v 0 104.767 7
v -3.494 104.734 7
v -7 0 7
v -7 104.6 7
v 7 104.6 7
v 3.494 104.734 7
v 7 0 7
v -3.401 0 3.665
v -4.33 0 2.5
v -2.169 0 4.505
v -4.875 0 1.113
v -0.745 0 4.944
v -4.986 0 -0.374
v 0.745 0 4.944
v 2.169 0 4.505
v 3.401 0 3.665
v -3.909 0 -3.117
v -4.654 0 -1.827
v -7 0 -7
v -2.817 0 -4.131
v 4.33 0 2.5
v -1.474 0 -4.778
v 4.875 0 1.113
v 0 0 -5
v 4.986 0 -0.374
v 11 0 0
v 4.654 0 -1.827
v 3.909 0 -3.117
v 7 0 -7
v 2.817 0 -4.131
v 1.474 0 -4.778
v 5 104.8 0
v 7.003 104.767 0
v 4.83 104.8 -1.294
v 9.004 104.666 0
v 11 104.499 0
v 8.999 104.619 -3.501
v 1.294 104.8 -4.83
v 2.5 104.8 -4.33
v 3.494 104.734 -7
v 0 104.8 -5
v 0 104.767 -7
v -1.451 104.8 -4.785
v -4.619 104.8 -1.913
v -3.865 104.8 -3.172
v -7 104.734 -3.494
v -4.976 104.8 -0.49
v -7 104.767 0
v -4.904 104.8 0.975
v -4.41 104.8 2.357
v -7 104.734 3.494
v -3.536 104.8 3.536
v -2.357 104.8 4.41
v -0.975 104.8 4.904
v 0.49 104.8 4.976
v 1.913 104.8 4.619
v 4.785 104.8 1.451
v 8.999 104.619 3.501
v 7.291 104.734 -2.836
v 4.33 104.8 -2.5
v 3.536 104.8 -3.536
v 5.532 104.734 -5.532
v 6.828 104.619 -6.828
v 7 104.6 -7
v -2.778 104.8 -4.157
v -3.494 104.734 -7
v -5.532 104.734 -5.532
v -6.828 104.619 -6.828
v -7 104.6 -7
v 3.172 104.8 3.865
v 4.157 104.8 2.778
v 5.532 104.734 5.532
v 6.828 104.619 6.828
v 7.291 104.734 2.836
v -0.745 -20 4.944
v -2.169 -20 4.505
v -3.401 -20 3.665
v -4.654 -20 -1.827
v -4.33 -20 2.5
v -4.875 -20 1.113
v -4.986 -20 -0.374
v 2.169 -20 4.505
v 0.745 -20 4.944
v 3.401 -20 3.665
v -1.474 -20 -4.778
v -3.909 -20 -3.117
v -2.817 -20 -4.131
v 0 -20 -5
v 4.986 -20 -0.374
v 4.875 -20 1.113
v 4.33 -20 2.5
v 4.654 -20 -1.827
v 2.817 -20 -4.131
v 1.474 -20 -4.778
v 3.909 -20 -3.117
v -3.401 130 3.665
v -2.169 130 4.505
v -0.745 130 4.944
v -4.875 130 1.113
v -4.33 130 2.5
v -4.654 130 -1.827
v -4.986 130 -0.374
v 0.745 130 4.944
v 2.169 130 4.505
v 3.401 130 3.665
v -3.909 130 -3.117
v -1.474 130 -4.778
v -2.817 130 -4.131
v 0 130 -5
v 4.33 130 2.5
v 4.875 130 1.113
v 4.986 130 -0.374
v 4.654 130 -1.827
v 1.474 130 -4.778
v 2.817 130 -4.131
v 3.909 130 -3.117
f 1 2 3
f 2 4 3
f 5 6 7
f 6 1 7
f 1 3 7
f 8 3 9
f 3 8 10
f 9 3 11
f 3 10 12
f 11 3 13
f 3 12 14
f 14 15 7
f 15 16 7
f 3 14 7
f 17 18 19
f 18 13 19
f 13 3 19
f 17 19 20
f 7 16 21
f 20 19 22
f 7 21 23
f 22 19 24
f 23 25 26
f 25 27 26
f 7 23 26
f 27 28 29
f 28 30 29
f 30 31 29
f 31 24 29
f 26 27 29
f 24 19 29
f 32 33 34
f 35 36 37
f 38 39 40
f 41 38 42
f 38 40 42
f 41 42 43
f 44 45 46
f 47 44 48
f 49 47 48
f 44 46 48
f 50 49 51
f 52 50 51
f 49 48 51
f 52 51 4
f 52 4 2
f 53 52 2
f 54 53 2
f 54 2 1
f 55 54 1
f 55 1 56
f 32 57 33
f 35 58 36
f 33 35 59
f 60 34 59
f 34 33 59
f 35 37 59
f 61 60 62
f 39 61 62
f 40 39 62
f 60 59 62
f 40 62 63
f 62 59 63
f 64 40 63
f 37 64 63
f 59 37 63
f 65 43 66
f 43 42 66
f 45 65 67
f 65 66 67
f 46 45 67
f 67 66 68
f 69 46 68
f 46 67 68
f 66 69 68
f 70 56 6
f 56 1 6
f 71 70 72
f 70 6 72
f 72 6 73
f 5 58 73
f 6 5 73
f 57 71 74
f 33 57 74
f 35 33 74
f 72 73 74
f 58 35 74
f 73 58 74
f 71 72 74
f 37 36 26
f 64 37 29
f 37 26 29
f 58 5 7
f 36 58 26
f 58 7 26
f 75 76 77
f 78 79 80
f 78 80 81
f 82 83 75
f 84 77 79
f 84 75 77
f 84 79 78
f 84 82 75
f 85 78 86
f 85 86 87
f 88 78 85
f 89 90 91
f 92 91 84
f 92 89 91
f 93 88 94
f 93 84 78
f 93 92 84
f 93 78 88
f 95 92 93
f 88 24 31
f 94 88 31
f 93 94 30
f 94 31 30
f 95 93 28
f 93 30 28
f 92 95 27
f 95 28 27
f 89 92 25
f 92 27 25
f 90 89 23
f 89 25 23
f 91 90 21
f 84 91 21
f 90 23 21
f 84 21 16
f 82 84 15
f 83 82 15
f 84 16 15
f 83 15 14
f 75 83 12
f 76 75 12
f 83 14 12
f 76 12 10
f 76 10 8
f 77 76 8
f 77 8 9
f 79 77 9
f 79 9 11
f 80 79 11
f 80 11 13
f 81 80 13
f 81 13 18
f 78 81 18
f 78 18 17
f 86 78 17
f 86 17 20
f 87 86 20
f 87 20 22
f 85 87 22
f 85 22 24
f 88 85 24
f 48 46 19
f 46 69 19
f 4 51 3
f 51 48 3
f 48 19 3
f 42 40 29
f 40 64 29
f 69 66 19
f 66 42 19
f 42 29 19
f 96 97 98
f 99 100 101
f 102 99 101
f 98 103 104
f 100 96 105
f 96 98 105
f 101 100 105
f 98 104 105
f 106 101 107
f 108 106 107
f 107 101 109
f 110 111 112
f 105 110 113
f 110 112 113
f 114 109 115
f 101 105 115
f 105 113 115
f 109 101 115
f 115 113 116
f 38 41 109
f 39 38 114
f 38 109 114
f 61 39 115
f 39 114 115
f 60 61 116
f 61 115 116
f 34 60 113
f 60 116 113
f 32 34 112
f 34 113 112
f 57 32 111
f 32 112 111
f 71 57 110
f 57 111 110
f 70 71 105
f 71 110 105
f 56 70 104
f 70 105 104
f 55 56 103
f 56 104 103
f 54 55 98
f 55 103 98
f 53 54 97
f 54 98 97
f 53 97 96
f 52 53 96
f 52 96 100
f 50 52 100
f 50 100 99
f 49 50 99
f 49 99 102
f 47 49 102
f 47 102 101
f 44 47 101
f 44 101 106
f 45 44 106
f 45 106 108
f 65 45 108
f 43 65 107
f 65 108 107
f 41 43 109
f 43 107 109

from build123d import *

# Parameters (mm, degrees)
CORPS_D_PLACER_COPIER2_DEPTH = 104.8
BOSS_EXTRU_1_DEPTH           = 20
BOSS_EXTRU_1_DEPTH_BACK      = 130
ESQUISSE1_R                  = 5


with BuildPart() as part:
    # Corps-Déplacer/Copier2: read off the stored shape, not the designer's step
    # Corps-Déplacer/Copier2 outline → Corps-Déplacer/Copier2 (new body)
    with BuildSketch(Plane(origin=(0, 0, 0), x_dir=(1, 0, 0), z_dir=(0, 1, 0))):
        Polygon((7, 7), (-7, 7), (-7, -7), (7, -7), (11, 0), align=None)
    extrude(amount=CORPS_D_PLACER_COPIER2_DEPTH)

    # Corps-D_placer_Copier2 2 outline → Corps-D_placer_Copier2 2 (revolve, cut)
    with BuildSketch(Plane.XY):
        with BuildLine():
            Line((11, 104.8), (5, 104.8))
            ThreePointArc((5, 104.8), (8.003766504, 104.724764387), (11, 104.499246226))
            Line((11, 104.499246226), (11, 104.8))
        make_face()
    revolve(axis=Axis((0, 0, 0), (0, 1, 0)), mode=Mode.SUBTRACT)

    # Esquisse1 → Boss.-Extru.1 (add, two sides: drawn at the far end of the back side and taken through both)
    with BuildSketch(Plane.XZ.offset(-BOSS_EXTRU_1_DEPTH_BACK)):
        with Locations(Location((0, 0, 0), (0, 0, 270))):
            Circle(ESQUISSE1_R)
    extrude(amount=BOSS_EXTRU_1_DEPTH + BOSS_EXTRU_1_DEPTH_BACK)


solid = part.part
